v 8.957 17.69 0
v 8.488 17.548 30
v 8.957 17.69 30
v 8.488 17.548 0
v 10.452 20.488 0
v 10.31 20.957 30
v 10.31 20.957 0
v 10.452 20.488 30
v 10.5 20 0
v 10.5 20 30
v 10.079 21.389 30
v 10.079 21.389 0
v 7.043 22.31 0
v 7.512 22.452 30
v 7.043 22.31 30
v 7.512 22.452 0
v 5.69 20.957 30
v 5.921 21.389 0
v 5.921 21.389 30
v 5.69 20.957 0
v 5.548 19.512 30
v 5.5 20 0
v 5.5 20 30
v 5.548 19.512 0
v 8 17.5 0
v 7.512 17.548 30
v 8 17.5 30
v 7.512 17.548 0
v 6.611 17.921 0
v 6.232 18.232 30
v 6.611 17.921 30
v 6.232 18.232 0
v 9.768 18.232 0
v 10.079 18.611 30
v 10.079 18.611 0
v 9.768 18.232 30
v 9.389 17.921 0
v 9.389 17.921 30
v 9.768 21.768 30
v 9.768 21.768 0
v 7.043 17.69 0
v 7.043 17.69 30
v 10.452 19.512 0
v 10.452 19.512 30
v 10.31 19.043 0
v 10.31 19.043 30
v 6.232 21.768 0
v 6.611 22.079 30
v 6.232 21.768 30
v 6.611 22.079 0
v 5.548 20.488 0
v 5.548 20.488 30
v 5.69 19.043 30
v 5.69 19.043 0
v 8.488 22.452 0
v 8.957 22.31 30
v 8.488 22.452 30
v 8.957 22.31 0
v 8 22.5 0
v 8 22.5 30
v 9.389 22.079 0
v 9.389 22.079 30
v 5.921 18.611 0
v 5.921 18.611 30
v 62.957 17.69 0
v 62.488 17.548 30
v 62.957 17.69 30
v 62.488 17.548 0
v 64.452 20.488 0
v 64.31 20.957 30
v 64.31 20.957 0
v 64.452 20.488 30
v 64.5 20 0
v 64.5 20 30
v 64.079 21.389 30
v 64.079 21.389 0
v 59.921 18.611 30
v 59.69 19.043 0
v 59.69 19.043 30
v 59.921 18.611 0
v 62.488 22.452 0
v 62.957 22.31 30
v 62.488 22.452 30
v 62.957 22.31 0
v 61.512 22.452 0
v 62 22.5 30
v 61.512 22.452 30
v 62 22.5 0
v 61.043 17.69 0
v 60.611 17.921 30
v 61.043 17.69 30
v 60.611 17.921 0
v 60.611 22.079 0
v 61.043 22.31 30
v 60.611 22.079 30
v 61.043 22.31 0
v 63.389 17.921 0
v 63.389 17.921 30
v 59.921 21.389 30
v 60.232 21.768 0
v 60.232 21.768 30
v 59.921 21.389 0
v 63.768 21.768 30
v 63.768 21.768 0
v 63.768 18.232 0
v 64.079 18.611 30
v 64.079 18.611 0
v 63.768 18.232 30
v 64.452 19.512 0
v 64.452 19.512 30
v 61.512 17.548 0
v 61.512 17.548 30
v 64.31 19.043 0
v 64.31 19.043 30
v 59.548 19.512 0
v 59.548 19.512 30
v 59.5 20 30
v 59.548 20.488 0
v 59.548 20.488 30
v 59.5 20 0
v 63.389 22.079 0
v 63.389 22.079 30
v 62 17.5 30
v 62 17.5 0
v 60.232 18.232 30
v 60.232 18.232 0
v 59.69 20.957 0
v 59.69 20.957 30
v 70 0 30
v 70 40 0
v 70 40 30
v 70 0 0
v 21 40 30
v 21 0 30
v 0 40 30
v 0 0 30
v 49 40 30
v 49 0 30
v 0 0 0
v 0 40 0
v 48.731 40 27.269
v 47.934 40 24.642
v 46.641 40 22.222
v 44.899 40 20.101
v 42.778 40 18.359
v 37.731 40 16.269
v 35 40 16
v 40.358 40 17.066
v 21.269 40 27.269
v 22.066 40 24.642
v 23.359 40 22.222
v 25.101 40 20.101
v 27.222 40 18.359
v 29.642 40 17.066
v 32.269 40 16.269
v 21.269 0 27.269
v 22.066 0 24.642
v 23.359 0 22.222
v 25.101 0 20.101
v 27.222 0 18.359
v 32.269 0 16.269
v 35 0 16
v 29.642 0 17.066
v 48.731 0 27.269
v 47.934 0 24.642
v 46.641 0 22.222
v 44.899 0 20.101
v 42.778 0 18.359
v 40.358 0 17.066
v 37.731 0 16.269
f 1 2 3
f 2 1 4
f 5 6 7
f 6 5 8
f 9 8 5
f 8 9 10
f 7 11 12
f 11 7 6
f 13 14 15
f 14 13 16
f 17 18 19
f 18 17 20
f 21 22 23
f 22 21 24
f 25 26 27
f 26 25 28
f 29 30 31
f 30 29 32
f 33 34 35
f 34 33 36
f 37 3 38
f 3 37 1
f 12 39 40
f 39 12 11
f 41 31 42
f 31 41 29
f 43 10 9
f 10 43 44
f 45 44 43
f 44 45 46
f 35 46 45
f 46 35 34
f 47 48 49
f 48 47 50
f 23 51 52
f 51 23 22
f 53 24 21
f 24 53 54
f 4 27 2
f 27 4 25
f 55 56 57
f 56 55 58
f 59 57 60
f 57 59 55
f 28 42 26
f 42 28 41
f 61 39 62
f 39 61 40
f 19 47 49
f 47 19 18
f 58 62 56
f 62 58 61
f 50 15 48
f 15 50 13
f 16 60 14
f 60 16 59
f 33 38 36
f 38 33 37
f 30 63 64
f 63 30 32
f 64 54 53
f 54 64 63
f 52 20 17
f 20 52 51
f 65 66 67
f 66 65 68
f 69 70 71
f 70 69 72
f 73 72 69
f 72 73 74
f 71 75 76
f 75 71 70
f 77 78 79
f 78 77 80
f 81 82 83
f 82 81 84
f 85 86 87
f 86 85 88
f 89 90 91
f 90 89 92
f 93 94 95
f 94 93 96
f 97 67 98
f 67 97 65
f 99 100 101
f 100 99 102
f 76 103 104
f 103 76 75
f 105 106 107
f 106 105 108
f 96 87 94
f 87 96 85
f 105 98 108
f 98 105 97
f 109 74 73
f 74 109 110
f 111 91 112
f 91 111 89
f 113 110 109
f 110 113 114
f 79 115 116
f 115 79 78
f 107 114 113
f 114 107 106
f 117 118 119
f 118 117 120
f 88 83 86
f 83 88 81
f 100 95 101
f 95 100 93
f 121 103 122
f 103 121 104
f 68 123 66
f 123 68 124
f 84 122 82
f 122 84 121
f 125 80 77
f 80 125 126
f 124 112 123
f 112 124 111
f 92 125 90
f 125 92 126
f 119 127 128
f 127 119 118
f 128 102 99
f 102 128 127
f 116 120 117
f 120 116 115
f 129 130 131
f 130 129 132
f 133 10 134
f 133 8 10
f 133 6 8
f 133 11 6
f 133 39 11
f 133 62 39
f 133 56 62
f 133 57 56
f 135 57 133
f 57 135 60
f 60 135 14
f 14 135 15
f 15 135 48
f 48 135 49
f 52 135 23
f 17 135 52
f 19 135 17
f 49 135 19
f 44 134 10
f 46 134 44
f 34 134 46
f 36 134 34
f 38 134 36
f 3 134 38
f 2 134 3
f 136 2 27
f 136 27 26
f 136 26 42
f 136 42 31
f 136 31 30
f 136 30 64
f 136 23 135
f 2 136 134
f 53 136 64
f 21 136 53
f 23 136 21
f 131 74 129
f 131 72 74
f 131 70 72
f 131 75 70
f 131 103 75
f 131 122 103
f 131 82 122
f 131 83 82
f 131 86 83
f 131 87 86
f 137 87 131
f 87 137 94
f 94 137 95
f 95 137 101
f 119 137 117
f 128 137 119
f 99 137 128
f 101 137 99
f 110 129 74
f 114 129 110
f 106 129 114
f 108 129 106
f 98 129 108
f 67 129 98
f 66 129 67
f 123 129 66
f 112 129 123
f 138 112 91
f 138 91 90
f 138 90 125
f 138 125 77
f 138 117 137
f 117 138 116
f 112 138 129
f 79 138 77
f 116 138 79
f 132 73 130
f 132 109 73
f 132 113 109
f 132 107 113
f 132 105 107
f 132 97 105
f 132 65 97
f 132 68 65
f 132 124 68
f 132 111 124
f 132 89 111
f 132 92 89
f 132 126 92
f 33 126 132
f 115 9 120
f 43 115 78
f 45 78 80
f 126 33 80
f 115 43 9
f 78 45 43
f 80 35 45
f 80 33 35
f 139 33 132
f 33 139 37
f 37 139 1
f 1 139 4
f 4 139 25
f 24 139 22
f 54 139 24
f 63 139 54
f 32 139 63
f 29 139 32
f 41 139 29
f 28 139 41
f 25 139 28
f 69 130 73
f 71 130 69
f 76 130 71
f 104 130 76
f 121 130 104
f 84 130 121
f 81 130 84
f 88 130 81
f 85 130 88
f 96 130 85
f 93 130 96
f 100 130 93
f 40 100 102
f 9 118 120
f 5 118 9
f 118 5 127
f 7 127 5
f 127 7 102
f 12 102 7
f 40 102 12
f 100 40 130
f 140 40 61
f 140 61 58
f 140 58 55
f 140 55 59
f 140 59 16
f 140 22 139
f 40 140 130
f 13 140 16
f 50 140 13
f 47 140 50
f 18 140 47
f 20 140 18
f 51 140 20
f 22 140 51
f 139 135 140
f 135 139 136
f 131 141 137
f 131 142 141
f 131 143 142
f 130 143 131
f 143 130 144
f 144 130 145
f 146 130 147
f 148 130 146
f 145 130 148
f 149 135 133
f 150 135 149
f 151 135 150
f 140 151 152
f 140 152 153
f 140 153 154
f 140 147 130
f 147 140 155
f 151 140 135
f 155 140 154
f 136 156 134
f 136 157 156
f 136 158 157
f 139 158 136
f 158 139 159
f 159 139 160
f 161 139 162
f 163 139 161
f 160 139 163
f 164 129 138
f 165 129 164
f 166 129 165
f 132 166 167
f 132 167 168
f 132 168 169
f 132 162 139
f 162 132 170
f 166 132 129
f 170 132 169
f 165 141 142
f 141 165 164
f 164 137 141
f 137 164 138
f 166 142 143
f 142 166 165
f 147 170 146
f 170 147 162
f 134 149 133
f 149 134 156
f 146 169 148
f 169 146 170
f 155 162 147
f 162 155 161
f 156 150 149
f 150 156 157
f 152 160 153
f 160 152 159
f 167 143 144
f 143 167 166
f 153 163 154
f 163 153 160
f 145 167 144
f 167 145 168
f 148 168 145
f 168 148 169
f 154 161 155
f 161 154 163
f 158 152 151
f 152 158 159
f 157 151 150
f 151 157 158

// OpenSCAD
$fn = 32;

// ----------------------------------------------------------------------
// Saddle clamp: plain shaft clamp
// ----------------------------------------------------------------------

// --- parameters (mm) ---
blk_l = 70;               // block length, X
blk_w = 40;               // block width, Y
blk_h = 30;               // block height
clamp_r = 14;             // shaft groove radius
hole_r = 2.5;             // bolt hole radius
hole_m = 8;               // bolt hole margin from the ends

saw_depth = clamp_r + 3;  // saw kerf depth

difference() {
  cube([blk_l, blk_w, blk_h]);
  translate([blk_l / 2, -1, blk_h])
    rotate([-90, 0, 0])
      cylinder(h = blk_w + 2, r = clamp_r);
  for (sx = [0, 1])
    translate([sx ? blk_l - hole_m : hole_m, blk_w / 2, -1])
      cylinder(r = hole_r, h = blk_h + 2);
}
